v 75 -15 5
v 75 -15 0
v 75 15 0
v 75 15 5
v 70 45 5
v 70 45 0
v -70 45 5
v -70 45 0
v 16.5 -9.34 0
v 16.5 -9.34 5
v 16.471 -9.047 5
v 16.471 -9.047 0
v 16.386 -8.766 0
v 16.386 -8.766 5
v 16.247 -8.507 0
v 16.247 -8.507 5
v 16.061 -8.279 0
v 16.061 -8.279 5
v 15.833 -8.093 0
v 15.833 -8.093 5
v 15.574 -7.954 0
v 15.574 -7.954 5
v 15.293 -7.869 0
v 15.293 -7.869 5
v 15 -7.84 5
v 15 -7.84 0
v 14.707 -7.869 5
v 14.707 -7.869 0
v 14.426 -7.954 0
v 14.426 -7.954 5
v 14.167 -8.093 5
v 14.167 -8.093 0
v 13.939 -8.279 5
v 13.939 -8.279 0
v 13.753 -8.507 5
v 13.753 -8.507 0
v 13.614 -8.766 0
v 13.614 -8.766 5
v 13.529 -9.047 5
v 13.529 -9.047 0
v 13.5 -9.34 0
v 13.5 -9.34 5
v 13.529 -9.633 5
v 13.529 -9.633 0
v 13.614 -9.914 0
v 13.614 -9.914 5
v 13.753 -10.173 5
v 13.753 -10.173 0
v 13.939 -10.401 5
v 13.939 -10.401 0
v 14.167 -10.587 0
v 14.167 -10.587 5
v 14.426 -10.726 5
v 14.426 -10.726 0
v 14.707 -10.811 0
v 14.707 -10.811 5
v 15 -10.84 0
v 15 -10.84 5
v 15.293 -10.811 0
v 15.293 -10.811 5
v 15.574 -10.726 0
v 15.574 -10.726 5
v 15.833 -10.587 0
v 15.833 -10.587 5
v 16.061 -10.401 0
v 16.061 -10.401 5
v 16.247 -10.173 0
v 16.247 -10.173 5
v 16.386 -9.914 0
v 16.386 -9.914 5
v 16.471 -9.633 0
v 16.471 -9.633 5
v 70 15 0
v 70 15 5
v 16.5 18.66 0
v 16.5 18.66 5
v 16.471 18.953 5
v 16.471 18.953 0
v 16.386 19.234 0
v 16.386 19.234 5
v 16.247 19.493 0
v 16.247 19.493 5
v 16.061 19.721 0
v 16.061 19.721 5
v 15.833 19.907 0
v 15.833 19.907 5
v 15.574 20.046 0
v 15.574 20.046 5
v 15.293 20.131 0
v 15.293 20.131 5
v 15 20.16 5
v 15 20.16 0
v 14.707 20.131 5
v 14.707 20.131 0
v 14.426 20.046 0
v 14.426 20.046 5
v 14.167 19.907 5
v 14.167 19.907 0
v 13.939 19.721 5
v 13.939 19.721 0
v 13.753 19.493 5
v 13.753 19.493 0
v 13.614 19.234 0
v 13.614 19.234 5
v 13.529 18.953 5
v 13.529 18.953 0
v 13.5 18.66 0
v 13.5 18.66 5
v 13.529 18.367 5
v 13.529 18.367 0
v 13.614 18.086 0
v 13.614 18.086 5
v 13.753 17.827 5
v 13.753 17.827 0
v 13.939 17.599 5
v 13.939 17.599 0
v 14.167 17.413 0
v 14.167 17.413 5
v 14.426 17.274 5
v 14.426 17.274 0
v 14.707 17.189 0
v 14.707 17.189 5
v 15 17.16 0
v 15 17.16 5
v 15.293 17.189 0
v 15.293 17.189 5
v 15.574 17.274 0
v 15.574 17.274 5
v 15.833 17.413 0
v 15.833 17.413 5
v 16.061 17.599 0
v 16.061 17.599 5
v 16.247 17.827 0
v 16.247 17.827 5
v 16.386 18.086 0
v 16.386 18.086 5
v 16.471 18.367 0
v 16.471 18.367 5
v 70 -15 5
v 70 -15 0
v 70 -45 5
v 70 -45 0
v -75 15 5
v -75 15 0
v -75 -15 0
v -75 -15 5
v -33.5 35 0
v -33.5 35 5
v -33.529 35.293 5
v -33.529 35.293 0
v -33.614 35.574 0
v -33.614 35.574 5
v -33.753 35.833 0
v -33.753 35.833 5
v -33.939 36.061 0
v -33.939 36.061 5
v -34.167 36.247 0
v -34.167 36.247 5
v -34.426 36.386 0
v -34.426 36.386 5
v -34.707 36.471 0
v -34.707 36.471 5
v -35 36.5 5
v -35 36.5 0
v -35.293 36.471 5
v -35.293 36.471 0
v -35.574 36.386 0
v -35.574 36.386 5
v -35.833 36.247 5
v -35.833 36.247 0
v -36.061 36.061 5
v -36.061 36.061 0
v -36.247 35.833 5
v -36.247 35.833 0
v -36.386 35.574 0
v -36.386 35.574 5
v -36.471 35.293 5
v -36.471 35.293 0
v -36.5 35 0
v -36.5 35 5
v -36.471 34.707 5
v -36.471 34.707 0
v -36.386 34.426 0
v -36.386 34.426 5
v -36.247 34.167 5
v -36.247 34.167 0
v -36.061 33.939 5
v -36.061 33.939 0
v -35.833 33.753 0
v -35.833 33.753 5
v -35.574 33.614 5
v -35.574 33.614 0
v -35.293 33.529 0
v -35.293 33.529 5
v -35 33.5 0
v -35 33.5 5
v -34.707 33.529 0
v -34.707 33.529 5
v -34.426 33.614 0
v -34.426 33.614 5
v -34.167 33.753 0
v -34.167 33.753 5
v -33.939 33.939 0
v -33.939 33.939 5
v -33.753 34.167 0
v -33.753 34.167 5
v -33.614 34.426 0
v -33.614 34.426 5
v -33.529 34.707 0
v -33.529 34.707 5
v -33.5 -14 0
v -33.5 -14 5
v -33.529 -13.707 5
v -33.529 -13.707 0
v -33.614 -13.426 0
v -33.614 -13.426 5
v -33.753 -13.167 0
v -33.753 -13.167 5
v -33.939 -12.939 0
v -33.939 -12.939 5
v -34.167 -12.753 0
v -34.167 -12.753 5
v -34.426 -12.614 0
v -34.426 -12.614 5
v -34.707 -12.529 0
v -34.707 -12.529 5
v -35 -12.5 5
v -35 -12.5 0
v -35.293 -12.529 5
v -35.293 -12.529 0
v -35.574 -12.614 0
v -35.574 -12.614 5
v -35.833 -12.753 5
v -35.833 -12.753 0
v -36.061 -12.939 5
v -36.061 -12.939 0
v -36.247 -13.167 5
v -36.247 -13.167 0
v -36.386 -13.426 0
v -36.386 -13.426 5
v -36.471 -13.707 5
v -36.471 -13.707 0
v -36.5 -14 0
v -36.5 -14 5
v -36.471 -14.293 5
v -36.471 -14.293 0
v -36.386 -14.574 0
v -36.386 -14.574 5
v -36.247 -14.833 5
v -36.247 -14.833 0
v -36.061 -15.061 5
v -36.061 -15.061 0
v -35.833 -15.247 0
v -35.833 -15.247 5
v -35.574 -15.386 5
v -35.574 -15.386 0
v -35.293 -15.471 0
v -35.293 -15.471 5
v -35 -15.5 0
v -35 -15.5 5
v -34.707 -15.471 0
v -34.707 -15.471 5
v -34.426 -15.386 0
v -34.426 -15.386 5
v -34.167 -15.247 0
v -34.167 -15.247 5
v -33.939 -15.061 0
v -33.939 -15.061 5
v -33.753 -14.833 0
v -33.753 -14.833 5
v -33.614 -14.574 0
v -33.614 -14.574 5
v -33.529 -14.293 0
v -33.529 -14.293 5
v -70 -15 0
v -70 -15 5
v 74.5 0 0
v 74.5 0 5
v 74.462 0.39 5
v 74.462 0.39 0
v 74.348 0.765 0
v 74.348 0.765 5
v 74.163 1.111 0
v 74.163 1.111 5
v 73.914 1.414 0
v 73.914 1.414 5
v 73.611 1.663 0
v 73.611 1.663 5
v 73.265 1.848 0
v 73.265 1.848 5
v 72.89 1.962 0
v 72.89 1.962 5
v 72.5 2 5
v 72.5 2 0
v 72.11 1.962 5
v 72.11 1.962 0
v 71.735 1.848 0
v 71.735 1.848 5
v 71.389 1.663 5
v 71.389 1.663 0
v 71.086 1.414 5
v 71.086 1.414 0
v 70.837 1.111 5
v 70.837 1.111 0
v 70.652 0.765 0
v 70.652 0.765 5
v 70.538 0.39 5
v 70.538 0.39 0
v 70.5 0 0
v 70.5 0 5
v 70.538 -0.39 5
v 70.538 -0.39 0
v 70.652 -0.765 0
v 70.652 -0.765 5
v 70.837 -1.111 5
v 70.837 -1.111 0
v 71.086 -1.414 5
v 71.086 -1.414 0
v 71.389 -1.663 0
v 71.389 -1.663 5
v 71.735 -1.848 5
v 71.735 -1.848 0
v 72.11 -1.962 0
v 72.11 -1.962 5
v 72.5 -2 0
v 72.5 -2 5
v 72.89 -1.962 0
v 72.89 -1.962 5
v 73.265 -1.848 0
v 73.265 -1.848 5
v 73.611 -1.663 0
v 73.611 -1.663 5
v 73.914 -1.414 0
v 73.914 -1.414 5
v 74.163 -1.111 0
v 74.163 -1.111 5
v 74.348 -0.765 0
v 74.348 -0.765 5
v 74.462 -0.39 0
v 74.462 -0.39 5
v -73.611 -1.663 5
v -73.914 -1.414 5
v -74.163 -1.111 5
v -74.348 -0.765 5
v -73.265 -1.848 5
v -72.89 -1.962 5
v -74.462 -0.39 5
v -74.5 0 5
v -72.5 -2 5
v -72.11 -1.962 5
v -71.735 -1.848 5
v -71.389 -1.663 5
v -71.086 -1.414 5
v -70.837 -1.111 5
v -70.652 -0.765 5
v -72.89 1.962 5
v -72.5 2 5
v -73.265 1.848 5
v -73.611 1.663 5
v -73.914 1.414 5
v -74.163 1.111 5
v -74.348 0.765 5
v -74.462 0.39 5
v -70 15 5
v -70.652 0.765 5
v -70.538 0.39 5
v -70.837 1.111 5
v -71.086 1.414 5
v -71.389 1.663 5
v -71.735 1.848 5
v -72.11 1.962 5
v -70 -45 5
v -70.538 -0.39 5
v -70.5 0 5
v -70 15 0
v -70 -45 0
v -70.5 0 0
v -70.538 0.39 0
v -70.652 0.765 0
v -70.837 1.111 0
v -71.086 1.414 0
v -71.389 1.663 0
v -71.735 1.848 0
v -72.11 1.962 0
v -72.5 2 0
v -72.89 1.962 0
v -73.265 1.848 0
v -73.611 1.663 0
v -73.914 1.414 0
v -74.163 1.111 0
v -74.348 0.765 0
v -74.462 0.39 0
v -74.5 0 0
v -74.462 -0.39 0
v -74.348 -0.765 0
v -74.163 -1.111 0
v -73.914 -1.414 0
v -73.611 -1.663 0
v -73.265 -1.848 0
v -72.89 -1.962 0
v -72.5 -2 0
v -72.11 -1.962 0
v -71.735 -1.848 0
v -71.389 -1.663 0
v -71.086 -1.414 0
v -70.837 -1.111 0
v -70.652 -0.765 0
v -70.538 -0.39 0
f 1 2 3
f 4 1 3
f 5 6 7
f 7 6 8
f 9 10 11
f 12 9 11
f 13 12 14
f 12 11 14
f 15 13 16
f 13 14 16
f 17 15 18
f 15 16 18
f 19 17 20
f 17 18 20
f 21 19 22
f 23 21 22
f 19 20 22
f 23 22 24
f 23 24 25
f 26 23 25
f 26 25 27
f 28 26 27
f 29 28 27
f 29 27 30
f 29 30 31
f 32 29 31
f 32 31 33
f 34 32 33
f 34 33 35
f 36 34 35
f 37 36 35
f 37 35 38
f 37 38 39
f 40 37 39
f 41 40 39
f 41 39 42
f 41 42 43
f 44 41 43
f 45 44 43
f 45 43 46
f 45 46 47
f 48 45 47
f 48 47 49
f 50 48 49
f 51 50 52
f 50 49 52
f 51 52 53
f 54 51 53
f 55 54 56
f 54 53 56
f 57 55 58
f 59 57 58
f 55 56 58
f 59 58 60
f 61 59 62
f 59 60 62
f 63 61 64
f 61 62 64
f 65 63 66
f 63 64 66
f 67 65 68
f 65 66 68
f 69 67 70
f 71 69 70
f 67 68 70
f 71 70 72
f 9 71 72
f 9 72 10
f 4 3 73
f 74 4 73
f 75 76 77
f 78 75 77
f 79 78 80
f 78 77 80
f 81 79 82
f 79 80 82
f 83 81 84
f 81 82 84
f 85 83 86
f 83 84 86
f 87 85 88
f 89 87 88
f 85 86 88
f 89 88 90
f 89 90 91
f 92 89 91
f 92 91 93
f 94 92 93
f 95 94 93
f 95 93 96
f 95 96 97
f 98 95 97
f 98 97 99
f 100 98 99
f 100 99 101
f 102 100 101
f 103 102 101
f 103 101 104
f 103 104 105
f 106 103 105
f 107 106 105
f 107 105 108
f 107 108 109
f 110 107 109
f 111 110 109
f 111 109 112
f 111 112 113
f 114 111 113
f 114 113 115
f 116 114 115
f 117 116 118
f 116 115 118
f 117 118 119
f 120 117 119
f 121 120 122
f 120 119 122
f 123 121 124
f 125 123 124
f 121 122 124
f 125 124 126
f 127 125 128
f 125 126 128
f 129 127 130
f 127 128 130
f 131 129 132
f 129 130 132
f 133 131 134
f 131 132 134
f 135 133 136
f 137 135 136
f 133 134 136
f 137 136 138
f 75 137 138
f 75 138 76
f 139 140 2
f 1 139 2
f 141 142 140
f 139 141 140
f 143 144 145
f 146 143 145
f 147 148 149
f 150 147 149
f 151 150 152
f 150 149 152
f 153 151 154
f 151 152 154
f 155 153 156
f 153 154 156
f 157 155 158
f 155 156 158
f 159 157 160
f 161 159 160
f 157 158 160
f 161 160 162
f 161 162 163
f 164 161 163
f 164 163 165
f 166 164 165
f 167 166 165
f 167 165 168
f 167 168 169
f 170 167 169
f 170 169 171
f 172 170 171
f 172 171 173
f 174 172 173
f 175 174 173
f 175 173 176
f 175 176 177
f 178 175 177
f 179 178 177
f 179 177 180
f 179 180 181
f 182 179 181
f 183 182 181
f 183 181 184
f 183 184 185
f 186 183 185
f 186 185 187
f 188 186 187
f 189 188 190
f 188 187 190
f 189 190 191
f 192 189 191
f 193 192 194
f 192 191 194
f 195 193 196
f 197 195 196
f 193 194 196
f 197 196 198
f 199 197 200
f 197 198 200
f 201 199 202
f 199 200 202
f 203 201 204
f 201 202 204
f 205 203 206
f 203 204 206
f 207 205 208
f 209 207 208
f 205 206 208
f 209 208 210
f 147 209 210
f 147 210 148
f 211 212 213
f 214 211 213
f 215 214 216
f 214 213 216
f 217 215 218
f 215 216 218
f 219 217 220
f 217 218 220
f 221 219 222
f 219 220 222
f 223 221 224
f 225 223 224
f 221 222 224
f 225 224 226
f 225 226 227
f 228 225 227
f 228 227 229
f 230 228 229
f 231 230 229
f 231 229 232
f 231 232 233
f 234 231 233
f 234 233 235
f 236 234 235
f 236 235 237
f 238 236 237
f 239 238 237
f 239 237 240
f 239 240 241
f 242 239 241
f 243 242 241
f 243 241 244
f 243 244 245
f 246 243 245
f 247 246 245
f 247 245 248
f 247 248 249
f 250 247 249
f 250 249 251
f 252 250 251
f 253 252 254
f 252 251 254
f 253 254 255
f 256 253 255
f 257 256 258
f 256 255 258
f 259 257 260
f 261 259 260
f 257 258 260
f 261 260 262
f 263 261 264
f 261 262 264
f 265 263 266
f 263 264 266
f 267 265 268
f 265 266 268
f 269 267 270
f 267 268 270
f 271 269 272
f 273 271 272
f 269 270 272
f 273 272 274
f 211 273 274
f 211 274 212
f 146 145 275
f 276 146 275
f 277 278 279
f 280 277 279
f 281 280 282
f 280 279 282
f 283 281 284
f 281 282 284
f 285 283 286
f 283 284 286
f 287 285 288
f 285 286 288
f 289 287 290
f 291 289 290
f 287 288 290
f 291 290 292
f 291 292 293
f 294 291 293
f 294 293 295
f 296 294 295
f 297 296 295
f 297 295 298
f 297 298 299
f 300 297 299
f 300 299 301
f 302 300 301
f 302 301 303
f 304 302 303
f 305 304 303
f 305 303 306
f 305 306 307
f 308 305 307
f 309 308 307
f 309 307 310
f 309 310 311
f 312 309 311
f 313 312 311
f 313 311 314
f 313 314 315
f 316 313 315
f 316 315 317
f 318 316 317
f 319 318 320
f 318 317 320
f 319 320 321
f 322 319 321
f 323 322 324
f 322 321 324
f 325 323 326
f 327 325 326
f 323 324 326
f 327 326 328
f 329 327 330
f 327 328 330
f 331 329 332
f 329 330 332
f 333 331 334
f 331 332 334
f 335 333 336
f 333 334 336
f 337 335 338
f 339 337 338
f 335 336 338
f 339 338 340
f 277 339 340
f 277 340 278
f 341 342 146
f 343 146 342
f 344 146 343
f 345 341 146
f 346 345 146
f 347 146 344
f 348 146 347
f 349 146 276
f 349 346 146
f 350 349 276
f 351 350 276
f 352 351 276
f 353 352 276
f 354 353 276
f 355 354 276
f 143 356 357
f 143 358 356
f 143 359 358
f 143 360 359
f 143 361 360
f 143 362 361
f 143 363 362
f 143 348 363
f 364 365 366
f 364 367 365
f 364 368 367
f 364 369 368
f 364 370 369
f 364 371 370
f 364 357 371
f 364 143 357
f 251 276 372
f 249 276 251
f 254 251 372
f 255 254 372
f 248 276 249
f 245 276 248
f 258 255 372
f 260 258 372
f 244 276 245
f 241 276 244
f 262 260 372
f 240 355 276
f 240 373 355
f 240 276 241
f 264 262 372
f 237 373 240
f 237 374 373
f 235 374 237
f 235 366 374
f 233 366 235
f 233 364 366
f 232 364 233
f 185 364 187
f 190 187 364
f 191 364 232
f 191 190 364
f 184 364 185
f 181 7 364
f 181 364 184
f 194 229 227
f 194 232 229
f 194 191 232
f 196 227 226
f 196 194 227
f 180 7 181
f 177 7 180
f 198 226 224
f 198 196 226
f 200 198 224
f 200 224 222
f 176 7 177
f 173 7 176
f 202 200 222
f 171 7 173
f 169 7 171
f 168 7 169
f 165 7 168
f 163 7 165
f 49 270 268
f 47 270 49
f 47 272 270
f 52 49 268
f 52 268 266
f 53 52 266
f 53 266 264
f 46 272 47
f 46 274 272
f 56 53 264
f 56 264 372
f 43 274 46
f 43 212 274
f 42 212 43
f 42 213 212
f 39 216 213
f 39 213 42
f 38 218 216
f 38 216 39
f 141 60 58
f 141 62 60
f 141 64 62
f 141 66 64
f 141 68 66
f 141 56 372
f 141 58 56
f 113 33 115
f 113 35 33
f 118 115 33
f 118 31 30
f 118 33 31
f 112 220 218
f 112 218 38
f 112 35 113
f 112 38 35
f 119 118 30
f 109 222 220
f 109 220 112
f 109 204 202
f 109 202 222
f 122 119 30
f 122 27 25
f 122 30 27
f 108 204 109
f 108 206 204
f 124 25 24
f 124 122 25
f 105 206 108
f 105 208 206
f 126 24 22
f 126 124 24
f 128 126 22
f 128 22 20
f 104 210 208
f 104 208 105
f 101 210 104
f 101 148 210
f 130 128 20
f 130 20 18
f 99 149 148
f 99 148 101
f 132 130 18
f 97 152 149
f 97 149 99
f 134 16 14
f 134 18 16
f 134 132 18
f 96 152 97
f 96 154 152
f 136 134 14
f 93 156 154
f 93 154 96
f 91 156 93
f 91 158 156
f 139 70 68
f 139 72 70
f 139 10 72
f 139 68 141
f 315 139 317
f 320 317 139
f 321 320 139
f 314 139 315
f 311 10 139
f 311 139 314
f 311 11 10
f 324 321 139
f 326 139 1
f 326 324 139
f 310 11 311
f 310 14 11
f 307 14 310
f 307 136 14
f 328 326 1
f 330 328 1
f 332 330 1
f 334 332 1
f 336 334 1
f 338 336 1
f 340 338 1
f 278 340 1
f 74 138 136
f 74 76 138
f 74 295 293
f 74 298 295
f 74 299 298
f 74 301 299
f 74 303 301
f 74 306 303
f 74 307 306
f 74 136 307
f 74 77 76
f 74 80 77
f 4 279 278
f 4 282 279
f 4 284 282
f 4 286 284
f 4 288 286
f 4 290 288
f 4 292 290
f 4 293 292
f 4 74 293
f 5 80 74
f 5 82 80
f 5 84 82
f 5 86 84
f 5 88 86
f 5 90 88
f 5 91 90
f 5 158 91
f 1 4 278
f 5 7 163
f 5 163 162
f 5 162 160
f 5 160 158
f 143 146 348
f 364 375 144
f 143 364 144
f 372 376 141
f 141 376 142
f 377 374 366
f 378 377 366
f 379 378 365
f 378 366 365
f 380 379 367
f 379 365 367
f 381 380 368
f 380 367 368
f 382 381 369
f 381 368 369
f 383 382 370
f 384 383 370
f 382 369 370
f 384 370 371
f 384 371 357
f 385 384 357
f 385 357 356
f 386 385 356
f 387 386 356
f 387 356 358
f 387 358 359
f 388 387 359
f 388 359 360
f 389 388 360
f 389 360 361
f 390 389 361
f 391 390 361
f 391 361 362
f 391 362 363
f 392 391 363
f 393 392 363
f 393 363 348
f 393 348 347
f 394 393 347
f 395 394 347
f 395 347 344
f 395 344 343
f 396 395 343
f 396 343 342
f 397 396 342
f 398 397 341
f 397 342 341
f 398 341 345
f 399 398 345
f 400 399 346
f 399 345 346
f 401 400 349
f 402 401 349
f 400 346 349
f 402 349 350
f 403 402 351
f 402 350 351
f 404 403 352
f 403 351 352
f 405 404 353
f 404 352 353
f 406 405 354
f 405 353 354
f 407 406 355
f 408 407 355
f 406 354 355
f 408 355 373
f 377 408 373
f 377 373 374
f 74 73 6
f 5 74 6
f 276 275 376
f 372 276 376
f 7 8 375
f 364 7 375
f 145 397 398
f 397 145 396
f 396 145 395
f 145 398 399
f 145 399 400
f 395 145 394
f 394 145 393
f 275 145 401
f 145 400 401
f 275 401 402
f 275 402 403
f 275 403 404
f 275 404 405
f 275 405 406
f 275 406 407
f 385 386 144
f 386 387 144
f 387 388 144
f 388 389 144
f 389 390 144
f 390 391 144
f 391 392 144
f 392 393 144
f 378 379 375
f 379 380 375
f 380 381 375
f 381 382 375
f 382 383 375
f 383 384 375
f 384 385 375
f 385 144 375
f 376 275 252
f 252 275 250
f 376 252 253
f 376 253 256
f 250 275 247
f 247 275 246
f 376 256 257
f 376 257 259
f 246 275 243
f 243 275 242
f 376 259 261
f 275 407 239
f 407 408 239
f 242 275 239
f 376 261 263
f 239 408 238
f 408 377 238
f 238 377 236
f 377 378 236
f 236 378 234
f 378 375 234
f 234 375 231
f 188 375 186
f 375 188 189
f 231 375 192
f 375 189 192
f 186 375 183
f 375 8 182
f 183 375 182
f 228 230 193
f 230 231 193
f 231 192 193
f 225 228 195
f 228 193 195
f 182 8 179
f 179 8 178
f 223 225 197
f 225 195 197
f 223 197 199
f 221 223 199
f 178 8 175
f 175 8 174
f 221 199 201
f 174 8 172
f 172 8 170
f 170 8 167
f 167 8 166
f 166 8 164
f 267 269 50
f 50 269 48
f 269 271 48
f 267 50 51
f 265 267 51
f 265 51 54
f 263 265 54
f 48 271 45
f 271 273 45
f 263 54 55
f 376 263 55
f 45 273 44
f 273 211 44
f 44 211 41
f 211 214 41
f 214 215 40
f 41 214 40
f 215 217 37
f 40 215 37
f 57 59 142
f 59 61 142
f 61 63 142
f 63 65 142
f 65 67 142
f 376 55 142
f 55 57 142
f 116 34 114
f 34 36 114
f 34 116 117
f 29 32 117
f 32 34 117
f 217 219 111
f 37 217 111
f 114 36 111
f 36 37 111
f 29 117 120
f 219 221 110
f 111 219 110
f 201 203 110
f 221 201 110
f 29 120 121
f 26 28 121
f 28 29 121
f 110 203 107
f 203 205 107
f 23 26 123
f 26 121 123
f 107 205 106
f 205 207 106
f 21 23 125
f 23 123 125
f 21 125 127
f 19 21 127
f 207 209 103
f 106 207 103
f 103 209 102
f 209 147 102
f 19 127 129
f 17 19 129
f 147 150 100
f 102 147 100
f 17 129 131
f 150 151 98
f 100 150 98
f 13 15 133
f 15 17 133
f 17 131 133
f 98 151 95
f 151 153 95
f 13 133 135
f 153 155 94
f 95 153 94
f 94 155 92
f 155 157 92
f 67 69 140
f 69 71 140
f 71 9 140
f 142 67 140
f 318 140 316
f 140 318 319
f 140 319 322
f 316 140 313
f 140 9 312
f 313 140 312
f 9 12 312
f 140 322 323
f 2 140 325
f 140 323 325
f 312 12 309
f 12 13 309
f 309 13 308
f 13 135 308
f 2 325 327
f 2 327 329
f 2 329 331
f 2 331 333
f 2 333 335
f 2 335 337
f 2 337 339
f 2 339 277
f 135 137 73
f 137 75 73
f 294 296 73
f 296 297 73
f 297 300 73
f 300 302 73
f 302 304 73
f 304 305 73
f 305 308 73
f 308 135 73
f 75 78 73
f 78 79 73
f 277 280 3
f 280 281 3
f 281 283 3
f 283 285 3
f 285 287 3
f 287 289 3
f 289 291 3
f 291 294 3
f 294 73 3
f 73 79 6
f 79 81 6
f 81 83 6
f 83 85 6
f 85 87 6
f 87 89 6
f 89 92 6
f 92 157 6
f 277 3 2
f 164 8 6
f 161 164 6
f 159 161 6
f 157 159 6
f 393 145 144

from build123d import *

# Parameters (mm, degrees)
BOSS_EXTRUDE1_DEPTH = 5
SKETCH2_R           = 1.5
CUT_EXTRUDE1_DEPTH  = 10
SKETCH3_R           = 2
CUT_EXTRUDE2_DEPTH  = 10


with BuildPart() as part:
    # Sketch1 → Boss-Extrude1 (new body)
    with BuildSketch(Plane.XY):
        Polygon((-75, -15), (-70, -15), (-70, -45), (70, -45), (70, -15), (75, -15), (75, 15), (70, 15), (70, 45), (-70, 45), (-70, 15), (-75, 15), align=None)
    extrude(amount=BOSS_EXTRUDE1_DEPTH)

    # Sketch2 → Cut-Extrude1 (cut)
    with BuildSketch(Plane.XY.offset(5)):
        with Locations((15, 18.66)):
            Circle(SKETCH2_R)
        with Locations((15, -9.34)):
            Circle(SKETCH2_R)
        with Locations((-35, 35)):
            Circle(SKETCH2_R)
        with Locations((-35, -14)):
            Circle(SKETCH2_R)
    extrude(amount=-CUT_EXTRUDE1_DEPTH, mode=Mode.SUBTRACT)

    # Sketch3 → Cut-Extrude2 (cut)
    with BuildSketch(Plane.XY.offset(5)):
        with Locations((-72.5, 0)):
            Circle(SKETCH3_R)
        with Locations((72.5, 0)):
            Circle(SKETCH3_R)
    extrude(amount=-CUT_EXTRUDE2_DEPTH, mode=Mode.SUBTRACT)


solid = part.part
